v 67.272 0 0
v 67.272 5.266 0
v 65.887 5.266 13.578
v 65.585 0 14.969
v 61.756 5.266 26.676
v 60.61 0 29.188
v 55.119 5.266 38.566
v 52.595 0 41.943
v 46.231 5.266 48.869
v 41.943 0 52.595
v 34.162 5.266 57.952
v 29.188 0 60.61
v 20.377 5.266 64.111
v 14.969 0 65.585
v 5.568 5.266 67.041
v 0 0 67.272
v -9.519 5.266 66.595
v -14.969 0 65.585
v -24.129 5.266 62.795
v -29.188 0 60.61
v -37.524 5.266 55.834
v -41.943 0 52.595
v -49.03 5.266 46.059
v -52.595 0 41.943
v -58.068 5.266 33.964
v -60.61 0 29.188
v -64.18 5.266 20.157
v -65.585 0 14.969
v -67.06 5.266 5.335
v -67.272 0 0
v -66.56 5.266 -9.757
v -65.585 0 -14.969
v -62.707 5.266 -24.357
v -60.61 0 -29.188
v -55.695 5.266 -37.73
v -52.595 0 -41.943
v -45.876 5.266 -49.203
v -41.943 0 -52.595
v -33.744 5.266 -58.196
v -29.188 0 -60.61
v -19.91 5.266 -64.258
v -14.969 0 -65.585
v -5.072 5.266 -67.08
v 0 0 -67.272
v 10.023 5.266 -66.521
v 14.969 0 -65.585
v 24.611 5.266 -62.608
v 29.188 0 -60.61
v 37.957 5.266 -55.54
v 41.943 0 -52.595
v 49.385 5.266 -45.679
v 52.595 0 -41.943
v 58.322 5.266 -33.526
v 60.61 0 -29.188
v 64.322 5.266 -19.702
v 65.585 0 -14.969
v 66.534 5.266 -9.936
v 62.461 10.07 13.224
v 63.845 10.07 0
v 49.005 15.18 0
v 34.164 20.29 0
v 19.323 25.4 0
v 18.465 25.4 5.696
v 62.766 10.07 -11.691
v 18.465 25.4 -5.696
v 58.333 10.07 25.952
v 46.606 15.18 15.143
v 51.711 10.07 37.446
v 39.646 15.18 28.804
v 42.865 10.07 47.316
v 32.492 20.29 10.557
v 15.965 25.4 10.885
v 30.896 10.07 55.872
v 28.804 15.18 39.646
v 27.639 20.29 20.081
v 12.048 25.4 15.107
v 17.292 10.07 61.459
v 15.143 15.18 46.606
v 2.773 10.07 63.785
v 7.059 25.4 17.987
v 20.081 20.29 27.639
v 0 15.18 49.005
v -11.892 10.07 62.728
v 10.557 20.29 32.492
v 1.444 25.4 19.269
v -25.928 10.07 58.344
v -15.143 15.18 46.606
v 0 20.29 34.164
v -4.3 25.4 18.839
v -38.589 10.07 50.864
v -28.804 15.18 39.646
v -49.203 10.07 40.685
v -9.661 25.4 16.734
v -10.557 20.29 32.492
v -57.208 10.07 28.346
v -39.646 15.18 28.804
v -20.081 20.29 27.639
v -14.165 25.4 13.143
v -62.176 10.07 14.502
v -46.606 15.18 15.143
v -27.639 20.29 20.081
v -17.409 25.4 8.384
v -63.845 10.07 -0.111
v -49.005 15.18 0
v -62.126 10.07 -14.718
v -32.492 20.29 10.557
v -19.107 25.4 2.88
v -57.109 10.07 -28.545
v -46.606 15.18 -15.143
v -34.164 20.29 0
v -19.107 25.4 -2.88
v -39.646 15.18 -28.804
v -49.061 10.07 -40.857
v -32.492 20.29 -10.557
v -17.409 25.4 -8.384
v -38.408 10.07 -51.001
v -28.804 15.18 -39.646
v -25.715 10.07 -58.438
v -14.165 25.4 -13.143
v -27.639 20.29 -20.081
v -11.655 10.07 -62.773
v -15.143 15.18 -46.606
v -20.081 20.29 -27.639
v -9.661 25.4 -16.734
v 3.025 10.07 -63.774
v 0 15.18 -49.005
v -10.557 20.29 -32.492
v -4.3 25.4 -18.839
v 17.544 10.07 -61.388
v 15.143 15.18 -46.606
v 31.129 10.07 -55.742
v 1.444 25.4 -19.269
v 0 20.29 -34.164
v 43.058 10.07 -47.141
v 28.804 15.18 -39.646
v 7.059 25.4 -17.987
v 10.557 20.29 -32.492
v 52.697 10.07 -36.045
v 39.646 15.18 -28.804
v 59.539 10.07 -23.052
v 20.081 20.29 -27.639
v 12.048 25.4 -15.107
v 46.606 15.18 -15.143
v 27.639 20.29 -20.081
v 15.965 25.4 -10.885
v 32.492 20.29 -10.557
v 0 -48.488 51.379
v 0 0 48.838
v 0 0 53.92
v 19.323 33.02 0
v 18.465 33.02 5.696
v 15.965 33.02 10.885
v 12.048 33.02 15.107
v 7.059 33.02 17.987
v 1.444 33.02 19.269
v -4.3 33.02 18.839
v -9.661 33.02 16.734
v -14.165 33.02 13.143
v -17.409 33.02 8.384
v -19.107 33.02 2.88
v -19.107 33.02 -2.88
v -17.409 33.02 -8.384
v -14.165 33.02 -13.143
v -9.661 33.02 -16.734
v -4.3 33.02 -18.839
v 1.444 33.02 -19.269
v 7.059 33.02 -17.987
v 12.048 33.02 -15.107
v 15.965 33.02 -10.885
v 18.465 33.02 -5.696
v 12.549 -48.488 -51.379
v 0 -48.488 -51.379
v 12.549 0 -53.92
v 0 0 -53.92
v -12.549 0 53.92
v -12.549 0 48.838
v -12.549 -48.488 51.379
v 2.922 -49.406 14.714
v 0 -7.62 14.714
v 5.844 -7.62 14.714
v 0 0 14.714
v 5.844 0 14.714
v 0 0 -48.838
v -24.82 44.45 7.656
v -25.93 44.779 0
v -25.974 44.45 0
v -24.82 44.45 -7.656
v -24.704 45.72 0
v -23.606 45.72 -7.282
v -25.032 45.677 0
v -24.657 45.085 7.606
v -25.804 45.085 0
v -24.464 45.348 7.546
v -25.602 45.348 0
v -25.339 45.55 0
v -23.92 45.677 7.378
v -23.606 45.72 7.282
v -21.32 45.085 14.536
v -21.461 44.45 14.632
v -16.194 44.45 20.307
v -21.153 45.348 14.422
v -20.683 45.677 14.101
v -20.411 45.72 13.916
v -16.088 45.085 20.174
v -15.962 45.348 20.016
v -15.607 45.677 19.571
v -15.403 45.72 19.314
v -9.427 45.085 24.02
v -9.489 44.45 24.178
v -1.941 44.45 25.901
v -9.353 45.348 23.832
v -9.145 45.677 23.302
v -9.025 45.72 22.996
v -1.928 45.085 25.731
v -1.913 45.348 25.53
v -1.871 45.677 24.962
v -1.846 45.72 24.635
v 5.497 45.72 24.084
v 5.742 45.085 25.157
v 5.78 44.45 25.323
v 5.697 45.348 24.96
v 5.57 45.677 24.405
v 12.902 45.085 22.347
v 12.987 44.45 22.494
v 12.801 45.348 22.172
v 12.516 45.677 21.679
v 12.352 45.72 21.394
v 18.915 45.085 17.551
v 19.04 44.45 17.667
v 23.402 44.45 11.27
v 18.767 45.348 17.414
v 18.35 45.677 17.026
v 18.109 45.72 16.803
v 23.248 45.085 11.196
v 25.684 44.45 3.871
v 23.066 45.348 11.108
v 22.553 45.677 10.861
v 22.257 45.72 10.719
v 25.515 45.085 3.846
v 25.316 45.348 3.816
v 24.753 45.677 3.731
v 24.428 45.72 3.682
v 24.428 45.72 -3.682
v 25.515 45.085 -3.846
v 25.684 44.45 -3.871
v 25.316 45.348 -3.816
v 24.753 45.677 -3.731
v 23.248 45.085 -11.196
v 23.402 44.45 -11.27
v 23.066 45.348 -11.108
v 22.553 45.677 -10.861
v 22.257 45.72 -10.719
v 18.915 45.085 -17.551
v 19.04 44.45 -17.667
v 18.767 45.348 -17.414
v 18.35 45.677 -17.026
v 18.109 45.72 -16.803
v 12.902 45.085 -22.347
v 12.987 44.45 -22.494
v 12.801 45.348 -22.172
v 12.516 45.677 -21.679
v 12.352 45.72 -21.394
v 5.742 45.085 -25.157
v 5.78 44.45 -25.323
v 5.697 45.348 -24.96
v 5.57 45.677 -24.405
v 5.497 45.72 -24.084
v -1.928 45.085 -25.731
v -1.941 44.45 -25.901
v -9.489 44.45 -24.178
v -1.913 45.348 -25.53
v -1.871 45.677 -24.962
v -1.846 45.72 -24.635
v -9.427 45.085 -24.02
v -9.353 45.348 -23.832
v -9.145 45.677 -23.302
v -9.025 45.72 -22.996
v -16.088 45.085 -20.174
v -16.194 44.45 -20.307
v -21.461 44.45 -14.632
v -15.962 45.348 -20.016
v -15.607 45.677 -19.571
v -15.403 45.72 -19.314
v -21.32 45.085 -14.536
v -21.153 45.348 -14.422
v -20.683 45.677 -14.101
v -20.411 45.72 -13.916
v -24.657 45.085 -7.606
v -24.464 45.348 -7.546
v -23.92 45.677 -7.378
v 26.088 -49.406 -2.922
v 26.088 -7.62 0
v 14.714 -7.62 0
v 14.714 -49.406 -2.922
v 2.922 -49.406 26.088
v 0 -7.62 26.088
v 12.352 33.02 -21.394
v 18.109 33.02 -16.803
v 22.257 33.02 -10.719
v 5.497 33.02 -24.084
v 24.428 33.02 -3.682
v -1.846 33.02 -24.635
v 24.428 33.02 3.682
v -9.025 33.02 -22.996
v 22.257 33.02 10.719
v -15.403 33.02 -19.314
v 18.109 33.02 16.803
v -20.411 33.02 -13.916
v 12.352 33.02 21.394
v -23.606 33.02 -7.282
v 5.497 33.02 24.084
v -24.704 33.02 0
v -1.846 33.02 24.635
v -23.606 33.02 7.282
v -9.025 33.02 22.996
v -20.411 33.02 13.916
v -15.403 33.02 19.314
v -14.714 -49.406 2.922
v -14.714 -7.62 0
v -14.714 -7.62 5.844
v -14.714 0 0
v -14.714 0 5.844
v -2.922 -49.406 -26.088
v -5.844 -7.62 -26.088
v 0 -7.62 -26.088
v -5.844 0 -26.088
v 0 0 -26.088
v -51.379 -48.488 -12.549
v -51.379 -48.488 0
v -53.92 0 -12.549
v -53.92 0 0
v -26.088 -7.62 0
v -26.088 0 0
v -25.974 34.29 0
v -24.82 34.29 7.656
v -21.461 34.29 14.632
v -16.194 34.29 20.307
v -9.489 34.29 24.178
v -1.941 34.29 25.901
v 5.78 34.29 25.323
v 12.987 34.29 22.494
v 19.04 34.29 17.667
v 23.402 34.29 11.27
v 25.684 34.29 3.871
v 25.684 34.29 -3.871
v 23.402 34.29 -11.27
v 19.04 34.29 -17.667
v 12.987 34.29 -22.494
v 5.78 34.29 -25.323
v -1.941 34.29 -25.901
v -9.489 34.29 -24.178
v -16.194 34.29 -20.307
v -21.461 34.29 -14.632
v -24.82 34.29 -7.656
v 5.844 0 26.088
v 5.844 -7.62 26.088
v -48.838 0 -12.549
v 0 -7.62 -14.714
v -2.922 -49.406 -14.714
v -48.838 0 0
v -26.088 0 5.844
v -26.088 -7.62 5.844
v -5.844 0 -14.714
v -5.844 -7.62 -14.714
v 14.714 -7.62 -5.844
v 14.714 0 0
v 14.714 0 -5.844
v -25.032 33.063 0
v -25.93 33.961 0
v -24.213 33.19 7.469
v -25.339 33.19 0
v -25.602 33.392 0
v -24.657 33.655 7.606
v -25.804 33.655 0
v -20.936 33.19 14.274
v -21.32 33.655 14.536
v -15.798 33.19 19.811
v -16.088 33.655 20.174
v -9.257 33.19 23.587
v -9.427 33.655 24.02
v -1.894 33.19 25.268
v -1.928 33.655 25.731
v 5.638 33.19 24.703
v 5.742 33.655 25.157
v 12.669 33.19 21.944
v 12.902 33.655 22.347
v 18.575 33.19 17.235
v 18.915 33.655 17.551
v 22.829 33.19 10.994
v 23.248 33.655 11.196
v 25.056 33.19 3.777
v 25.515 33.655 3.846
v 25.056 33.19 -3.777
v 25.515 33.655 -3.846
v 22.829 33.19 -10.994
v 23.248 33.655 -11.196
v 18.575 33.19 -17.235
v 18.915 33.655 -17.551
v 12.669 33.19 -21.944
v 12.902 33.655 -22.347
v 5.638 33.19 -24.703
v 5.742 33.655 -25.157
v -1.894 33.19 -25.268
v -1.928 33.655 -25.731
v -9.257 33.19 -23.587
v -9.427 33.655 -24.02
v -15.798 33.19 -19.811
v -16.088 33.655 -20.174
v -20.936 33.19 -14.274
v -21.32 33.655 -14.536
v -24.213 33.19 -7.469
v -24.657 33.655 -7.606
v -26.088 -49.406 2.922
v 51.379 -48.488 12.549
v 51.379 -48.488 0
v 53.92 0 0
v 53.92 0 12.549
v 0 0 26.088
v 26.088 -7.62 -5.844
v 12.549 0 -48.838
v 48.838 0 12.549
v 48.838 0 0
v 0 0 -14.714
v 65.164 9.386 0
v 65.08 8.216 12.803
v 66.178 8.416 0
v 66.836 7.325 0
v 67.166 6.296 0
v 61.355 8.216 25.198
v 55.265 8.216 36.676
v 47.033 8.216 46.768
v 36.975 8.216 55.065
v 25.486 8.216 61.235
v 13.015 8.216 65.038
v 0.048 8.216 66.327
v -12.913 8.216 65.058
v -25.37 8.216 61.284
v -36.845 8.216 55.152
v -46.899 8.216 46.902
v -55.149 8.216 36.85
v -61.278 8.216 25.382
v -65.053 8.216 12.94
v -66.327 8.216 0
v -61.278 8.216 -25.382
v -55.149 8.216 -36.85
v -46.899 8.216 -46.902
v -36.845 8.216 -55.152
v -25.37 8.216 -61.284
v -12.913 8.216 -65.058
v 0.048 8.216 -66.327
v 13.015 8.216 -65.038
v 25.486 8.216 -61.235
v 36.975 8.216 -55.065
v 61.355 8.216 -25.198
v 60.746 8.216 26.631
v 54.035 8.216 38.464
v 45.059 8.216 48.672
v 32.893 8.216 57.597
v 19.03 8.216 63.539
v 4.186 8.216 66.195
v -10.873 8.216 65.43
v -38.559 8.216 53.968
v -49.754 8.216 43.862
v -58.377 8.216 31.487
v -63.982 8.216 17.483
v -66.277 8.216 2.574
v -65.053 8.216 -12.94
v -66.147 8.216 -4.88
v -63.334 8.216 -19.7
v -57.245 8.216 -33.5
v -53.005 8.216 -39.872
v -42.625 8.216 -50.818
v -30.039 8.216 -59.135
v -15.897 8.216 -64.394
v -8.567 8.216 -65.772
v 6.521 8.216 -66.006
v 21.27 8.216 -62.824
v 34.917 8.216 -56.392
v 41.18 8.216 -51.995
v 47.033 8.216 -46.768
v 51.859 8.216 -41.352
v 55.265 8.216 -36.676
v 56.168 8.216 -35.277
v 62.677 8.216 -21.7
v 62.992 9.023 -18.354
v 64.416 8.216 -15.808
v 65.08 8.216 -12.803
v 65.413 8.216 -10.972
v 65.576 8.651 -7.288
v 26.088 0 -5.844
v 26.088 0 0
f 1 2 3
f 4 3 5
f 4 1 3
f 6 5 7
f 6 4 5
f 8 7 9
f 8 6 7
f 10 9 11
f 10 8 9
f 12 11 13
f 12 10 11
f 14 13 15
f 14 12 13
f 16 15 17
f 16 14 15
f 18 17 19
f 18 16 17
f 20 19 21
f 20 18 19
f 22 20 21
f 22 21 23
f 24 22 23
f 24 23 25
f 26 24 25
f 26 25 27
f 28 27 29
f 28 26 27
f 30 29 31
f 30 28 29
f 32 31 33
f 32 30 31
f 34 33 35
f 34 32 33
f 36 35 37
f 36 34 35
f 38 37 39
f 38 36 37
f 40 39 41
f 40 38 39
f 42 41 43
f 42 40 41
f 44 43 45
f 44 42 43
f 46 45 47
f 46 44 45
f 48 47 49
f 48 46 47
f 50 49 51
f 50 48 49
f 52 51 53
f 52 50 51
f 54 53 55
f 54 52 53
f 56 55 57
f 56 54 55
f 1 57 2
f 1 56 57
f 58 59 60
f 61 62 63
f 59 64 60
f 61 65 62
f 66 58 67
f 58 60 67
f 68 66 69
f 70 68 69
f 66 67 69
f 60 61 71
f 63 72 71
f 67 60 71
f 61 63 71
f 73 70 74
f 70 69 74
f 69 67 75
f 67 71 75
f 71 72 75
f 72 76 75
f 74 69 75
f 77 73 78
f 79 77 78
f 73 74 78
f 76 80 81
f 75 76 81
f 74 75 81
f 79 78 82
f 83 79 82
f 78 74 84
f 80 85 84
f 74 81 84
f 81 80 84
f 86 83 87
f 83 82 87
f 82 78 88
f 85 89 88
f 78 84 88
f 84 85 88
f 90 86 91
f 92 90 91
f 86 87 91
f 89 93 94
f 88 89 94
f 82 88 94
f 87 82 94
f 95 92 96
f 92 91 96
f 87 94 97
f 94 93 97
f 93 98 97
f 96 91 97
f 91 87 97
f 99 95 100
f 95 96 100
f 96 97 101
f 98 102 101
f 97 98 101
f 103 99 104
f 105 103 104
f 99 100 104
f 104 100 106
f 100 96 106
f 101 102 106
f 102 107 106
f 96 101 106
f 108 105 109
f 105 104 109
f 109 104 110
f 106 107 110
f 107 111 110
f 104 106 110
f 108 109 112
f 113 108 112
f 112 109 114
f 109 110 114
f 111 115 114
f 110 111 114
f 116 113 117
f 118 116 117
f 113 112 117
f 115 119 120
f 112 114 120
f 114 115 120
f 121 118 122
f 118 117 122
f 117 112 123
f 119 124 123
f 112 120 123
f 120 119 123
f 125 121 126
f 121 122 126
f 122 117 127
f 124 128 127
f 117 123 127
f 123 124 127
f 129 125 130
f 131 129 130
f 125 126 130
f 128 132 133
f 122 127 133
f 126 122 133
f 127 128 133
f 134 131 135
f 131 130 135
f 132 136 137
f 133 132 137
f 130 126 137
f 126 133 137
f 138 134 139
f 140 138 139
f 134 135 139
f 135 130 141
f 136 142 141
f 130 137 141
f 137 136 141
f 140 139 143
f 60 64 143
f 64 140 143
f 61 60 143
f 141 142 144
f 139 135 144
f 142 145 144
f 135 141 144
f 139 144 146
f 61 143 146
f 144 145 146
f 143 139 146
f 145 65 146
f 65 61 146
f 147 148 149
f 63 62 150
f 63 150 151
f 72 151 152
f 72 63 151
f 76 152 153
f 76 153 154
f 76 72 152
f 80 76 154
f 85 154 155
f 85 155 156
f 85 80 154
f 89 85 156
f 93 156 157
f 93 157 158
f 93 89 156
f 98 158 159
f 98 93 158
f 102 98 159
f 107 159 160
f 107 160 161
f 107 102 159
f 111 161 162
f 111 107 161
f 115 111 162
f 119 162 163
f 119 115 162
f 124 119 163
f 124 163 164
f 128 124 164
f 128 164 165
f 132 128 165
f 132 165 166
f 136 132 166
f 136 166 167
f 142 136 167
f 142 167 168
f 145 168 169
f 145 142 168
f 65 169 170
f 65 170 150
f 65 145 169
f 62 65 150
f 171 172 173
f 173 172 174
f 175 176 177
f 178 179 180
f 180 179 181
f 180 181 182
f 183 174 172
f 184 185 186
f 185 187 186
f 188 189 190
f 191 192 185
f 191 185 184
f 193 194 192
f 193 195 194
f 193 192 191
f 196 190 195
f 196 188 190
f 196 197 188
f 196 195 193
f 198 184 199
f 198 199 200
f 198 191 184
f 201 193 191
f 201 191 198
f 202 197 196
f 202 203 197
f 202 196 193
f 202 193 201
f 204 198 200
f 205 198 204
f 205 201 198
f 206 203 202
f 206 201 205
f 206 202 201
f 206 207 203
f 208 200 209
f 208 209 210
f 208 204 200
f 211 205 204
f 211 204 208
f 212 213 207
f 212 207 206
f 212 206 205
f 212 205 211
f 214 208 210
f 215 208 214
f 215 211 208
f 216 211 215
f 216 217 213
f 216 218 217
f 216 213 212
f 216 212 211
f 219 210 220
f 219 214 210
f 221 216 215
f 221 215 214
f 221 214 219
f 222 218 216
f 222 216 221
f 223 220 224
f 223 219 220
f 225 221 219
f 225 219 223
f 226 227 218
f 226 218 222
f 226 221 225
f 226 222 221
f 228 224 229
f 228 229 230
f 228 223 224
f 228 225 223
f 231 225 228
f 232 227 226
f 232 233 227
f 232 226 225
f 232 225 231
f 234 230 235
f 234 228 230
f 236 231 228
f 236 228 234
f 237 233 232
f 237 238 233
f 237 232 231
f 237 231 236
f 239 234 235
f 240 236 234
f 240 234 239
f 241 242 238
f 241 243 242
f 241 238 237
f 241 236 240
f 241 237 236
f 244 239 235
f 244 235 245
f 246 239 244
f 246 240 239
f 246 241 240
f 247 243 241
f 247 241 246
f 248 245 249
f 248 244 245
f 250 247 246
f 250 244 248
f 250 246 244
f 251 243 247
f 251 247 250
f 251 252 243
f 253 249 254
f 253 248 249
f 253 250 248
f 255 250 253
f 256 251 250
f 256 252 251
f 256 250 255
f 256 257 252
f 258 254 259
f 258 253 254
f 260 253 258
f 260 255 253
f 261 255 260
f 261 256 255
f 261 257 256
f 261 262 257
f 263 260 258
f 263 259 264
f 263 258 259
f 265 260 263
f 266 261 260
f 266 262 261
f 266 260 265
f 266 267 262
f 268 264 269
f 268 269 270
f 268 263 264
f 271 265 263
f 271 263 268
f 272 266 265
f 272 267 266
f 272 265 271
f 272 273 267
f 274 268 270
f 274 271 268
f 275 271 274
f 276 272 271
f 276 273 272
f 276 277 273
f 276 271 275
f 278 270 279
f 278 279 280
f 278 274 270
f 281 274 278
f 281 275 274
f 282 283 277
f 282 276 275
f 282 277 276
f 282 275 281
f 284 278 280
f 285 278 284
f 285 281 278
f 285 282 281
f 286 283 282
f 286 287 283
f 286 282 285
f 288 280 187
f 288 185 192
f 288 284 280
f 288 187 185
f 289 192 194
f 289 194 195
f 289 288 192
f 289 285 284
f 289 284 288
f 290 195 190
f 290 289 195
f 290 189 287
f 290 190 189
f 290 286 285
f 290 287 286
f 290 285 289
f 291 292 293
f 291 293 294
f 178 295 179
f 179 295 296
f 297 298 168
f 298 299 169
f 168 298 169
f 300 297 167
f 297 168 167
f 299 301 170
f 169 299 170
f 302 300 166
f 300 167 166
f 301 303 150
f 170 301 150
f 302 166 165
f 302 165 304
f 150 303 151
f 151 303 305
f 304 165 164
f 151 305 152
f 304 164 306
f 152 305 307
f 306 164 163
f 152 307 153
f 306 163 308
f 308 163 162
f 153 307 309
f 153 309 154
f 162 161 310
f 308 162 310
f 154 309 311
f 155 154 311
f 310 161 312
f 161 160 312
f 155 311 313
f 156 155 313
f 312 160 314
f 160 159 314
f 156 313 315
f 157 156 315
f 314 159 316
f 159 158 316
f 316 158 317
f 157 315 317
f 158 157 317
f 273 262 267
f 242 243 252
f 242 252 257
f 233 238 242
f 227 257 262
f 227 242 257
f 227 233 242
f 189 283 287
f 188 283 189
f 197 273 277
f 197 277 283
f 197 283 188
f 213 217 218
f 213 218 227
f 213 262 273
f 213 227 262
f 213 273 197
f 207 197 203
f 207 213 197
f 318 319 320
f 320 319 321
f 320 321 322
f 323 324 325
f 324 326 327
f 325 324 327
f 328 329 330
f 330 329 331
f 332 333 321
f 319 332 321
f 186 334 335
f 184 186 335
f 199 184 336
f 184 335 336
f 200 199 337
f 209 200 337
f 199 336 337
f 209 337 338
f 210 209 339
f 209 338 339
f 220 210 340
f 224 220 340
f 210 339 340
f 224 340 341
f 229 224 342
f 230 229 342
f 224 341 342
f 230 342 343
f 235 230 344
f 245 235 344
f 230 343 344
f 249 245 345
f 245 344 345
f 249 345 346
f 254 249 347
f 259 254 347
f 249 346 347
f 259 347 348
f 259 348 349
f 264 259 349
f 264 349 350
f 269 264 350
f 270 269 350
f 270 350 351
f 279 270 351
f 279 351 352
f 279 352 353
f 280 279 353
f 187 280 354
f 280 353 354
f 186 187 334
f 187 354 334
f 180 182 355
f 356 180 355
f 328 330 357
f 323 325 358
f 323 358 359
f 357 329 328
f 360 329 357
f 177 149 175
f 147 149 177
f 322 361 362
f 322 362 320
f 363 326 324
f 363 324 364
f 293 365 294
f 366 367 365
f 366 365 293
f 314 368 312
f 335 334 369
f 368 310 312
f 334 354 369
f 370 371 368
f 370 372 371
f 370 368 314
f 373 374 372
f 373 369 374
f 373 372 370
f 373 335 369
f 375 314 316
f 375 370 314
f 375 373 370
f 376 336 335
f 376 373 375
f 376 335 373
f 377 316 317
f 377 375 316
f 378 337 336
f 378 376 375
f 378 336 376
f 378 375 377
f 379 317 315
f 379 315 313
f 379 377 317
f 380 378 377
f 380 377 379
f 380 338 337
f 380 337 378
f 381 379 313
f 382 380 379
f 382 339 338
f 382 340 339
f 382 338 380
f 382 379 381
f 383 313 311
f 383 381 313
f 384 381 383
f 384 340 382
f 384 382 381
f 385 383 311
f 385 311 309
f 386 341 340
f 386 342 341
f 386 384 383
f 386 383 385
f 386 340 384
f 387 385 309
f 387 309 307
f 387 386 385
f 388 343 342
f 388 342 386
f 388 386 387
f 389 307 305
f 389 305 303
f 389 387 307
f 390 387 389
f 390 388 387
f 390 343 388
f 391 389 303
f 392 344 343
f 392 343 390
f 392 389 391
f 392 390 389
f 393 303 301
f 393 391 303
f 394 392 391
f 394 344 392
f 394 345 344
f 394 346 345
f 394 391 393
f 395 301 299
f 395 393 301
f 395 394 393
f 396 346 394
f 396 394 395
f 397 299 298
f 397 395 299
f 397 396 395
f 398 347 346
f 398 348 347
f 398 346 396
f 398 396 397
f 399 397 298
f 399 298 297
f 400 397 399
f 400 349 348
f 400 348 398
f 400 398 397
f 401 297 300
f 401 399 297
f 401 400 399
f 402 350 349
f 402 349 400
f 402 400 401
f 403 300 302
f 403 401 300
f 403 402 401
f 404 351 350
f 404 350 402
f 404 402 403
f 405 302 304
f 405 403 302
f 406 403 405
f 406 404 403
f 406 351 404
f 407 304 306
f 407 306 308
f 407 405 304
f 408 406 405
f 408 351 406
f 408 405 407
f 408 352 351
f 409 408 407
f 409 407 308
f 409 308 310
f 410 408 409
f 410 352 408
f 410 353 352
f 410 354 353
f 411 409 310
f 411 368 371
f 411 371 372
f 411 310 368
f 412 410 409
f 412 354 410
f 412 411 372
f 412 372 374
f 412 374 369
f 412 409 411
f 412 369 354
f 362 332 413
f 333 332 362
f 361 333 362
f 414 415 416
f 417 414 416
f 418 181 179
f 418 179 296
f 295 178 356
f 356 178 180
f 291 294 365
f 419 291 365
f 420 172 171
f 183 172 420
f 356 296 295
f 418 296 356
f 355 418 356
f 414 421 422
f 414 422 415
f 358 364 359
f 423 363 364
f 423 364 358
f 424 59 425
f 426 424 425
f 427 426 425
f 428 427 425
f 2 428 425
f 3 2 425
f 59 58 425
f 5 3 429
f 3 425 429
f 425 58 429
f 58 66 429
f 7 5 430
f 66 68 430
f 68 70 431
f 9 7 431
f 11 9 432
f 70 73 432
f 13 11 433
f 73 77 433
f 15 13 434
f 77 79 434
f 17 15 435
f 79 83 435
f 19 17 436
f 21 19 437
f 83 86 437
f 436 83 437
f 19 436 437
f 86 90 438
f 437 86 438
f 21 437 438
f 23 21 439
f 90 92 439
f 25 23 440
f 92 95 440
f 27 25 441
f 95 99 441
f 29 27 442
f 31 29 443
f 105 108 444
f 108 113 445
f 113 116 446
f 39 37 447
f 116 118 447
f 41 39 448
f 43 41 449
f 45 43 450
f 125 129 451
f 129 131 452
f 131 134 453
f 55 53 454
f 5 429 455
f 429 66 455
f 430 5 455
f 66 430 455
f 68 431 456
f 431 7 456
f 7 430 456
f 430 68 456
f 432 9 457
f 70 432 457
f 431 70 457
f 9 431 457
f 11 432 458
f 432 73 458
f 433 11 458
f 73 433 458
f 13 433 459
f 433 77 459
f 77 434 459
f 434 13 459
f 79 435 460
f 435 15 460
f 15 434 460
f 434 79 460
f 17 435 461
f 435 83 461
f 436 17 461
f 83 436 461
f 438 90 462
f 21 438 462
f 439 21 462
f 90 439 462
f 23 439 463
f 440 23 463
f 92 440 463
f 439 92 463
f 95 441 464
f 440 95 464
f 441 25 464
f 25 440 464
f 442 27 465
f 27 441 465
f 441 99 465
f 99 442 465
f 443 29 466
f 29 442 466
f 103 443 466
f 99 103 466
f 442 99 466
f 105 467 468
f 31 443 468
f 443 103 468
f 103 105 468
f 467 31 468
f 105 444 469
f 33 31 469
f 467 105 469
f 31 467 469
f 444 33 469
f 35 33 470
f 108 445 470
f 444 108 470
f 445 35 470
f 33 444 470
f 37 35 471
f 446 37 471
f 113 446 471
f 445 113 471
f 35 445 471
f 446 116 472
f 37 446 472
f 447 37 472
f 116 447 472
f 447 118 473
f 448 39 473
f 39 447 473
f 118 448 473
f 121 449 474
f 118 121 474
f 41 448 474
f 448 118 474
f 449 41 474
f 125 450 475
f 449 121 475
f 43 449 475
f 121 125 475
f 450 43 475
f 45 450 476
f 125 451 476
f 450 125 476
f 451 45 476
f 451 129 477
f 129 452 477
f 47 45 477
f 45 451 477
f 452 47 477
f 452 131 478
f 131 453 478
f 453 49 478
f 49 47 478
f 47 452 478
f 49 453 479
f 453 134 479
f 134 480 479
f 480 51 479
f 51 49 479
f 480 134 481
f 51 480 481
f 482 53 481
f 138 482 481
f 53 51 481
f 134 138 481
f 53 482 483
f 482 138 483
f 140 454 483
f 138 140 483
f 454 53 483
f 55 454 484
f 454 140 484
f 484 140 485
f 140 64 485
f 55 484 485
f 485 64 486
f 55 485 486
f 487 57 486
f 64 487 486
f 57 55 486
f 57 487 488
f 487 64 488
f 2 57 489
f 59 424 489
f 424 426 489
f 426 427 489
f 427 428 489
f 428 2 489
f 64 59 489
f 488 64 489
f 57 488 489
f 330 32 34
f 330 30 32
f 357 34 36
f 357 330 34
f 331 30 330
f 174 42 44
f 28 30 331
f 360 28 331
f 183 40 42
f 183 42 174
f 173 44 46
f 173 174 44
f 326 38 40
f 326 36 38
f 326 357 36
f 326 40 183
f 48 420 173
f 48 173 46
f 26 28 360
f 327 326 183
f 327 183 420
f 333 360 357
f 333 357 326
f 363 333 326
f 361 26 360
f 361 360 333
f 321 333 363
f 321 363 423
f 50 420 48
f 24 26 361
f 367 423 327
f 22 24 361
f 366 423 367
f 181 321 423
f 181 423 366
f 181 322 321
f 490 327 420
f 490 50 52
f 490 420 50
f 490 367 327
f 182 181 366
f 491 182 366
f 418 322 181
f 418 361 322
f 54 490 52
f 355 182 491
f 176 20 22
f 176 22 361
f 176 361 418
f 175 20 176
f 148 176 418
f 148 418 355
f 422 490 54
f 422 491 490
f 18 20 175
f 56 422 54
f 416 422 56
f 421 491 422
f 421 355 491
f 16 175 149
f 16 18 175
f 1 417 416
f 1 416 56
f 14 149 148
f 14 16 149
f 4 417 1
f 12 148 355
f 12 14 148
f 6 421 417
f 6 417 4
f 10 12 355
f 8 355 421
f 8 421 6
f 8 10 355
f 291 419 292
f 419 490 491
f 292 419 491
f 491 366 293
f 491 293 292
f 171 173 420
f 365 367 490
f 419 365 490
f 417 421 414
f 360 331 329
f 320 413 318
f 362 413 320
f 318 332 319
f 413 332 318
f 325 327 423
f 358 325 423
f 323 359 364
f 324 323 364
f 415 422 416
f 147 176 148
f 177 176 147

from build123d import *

# Parameters (mm, degrees)
F0_R         = 67.2715048221
F1_DEPTH     = 25.4
F2_SIZE2     = 47.9485215904
F2_SIZE      = 16.51
F3_DEPTH     = 7.62
F4_R         = 25.9737658724
F5_DEPTH     = 12.7
F6_W         = 12.5492112711
F6_H         = 5.0823129714
F6_W_2       = 5.8439155109
F6_H_2       = 11.3746980205
F6_W_3       = 5.0823129714
F6_H_3       = 12.5492112711
F6_W_4       = 11.3746980205
F6_H_4       = 5.8439155109
F7_DEPTH     = 50.8
F8_T4_DEPTH  = 276.6958225406
F8_T9_DEPTH  = 276.6958225406
F9_T4_DEPTH  = 235.8904693574
F9_T9_DEPTH  = 235.8904693574
F10_T1_DEPTH = 123.632583689
F11_T4_DEPTH = 235.8904693574
F11_T9_DEPTH = 235.8904693574
F12_T4_DEPTH = 235.8904693574
F12_T9_DEPTH = 235.8904693574
F13_T4_DEPTH = 276.6958225406
F13_T9_DEPTH = 276.6958225406
F14_T4_DEPTH = 276.6958225406
F14_T9_DEPTH = 276.6958225406
F15_T4_DEPTH = 276.6958225406
F15_T9_DEPTH = 276.6958225406
F16_R        = 5.08
F17_R        = 1.27


# Not quite as in the source:
# - a fillet or chamfer that OpenCascade refuses, or shapes differently, is made with other operations: its cross-section is extruded or revolved along the edge and cut away or added


with BuildPart() as f1:
    # F0 (on Front) → F1 (new body)
    with BuildSketch(Plane.XZ):
        Circle(F0_R)
    extrude(amount=-F1_DEPTH)

    # F2
    f2_edges = [f1.edges().sort_by_distance(p)[0] for p in [
        (-67.271505, 25.4, 0),
    ]]
    f2_side = f1.faces().sort_by_distance((-67.271505, 12.7, 0))[0]
    chamfer(f2_edges, length=F2_SIZE, length2=F2_SIZE2, reference=f2_side)

    # F3 (add): a face of the model
    f3_faces = [f1.faces().sort_by_distance(p)[0] for p in [
        (0, 25.4, 0),
    ]]
    extrude(f3_faces, amount=F3_DEPTH)

    # F4 (on face) → F5 (join)
    with BuildSketch(Plane(origin=(0, 33.02, 0), x_dir=(-1, 0, 0), z_dir=(0, 1, 0))):
        Circle(F4_R)
    extrude(amount=F5_DEPTH)

    # F6 (on face) → F7 (join)
    with BuildSketch(Plane.XZ):
        with Locations((-6.2746056356, 51.3789299875)):
            Rectangle(F6_W, F6_H)
        with Locations((2.9219577555, 20.4010321759)):
            Rectangle(F6_W_2, F6_H_2)
        with Locations((-51.3789299875, -6.2746056356)):
            Rectangle(F6_W_3, F6_H_3)
        with Locations((-20.4010321759, 2.9219577555)):
            Rectangle(F6_W_4, F6_H_4)
        with Locations((6.2746056356, -51.3789299875)):
            Rectangle(F6_W, F6_H)
        with Locations((-2.9219577555, -20.4010321759)):
            Rectangle(F6_W_2, F6_H_2)
        with Locations((51.3789299875, 6.2746056356)):
            Rectangle(F6_W_3, F6_H_3)
        with Locations((20.4010321759, -2.9219577555)):
            Rectangle(F6_W_4, F6_H_4)
    extrude(amount=F7_DEPTH)

    # F8: chamfer of 50.8 x 2.6623151876 on 2 edges, made by hand


with BuildPart() as f8_tool2:
    # F8_s3 → F8_t4 (new body)
    with BuildSketch(Plane.YZ.offset(132.0733056347)):
        Polygon((0, 53.9200864732), (-50.8, 51.2577712856), (-50.8, 53.9200864732), align=None)
    extrude(amount=-F8_T4_DEPTH)

    split(bisect_by=Plane.XZ, keep=Keep.TOP)


with BuildPart() as f1_1:
    add(f1.part)

    # F8_t1: cut F8_tool2
    add(f8_tool2.part, mode=Mode.SUBTRACT)


with BuildPart() as f8_tool7:
    # F8_s8 → F8_t9 (new body)
    with BuildSketch(Plane.YZ.offset(-144.6225169058)):
        Polygon((0, 48.8377735019), (-50.8, 51.5000886895), (-50.8, 48.8377735019), align=None)
    extrude(amount=F8_T9_DEPTH)

    split(bisect_by=Plane.XZ, keep=Keep.TOP)


with BuildPart() as f1_2:
    add(f1_1.part)

    # F8_t6: cut F8_tool7
    add(f8_tool7.part, mode=Mode.SUBTRACT)

    # F9: chamfer of 43.18 x 3.0194397397 on 2 edges, made by hand


with BuildPart() as f9_tool2:
    # F9_s3 → F9_t4 (new body)
    with BuildSketch(Plane.XY.offset(-97.5442025028)):
        Polygon((2.8244757712, -50.8), (5.8439155109, -7.62), (5.8439155109, -50.8), align=None)
    extrude(amount=F9_T4_DEPTH)

    split(bisect_by=Plane.XY.offset(-48.8377735019), keep=Keep.TOP)


with BuildPart() as f1_3:
    add(f1_2.part)

    # F9_t1: cut F9_tool2
    add(f9_tool2.part, mode=Mode.SUBTRACT)


with BuildPart() as f9_tool7:
    # F9_s8 → F9_t9 (new body)
    with BuildSketch(Plane.XY.offset(138.3462668546)):
        Polygon((3.0194397397, -50.8), (0, -7.62), (0, -50.8), align=None)
    extrude(amount=-F9_T9_DEPTH)

    split(bisect_by=Plane.XY.offset(-26.0883811861), keep=Keep.TOP)


with BuildPart() as f1_4:
    add(f1_3.part)

    # F9_t6: cut F9_tool7
    add(f9_tool7.part, mode=Mode.SUBTRACT)

    # F10: chamfer of 43.18 x 3.0194397397 on 2 edges, made by hand

    # F10_s2 → F10_t1 (cut)
    with BuildSketch(Plane.YZ.offset(-138.3462668546)):
        Polygon((-7.62, 0), (-50.8, 3.0194397397), (-50.8, 0), align=None)
        Polygon((-50.8, 2.8244757712), (-7.62, 5.8439155109), (-50.8, 5.8439155109), align=None)
    extrude(amount=F10_T1_DEPTH, mode=Mode.SUBTRACT)

    # F11: chamfer of 43.18 x 3.0194397397 on 2 edges, made by hand


with BuildPart() as f11_tool2:
    # F11_s3 → F11_t4 (new body)
    with BuildSketch(Plane.XY.offset(97.5442025028)):
        Polygon((-2.8244757712, -50.8), (-5.8439155109, -7.62), (-5.8439155109, -50.8), align=None)
    extrude(amount=-F11_T4_DEPTH)

    split(bisect_by=Plane(origin=(0, 2.5524687068, 48.7040042853), x_dir=(1, 0, 0), z_dir=(0, -0.0523359562, -0.9986295348)), keep=Keep.TOP)


with BuildPart() as f1_5:
    add(f1_4.part)

    # F11_t1: cut F11_tool2
    add(f11_tool2.part, mode=Mode.SUBTRACT)


with BuildPart() as f11_tool7:
    # F11_s8 → F11_t9 (new body)
    with BuildSketch(Plane.XY.offset(-138.3462668546)):
        Polygon((0, -7.62), (-3.0194397397, -50.8), (0, -50.8), align=None)
    extrude(amount=F11_T9_DEPTH)

    split(bisect_by=Plane(origin=(0, 2.5524687068, 48.7040042853), x_dir=(1, 0, 0), z_dir=(0, -0.0523359562, -0.9986295348)), keep=Keep.TOP)


with BuildPart() as f1_6:
    add(f1_5.part)

    # F11_t6: cut F11_tool7
    add(f11_tool7.part, mode=Mode.SUBTRACT)

    # F12: chamfer of 43.18 x 3.0194397397 on 2 edges, made by hand


with BuildPart() as f12_tool2:
    # F12_s3 → F12_t4 (new body)
    with BuildSketch(Plane.YZ.offset(-97.5442025028)):
        Polygon((-50.8, -2.8244757712), (-7.62, -5.8439155109), (-50.8, -5.8439155109), align=None)
    extrude(amount=F12_T4_DEPTH)

    split(bisect_by=Plane.YZ.offset(-48.8377735019), keep=Keep.TOP)


with BuildPart() as f1_7:
    add(f1_6.part)

    # F12_t1: cut F12_tool2
    add(f12_tool2.part, mode=Mode.SUBTRACT)


with BuildPart() as f12_tool7:
    # F12_s8 → F12_t9 (new body)
    with BuildSketch(Plane.YZ.offset(138.3462668546)):
        Polygon((-7.62, 0), (-50.8, -3.0194397397), (-50.8, 0), align=None)
    extrude(amount=-F12_T9_DEPTH)

    split(bisect_by=Plane.YZ.offset(-48.8377735019), keep=Keep.TOP)


with BuildPart() as f1_8:
    add(f1_7.part)

    # F12_t6: cut F12_tool7
    add(f12_tool7.part, mode=Mode.SUBTRACT)

    # F13: chamfer of 50.8 x 2.6623151876 on 2 edges, made by hand


with BuildPart() as f13_tool2:
    # F13_s3 → F13_t4 (new body)
    with BuildSketch(Plane.XY.offset(132.0733056347)):
        Polygon((-51.5000886895, -50.8), (-48.8377735019, 0), (-48.8377735019, -50.8), align=None)
    extrude(amount=-F13_T4_DEPTH)

    split(bisect_by=Plane.XZ, keep=Keep.TOP)


with BuildPart() as f1_9:
    add(f1_8.part)

    # F13_t1: cut F13_tool2
    add(f13_tool2.part, mode=Mode.SUBTRACT)


with BuildPart() as f13_tool7:
    # F13_s8 → F13_t9 (new body)
    with BuildSketch(Plane.XY.offset(132.0733056347)):
        Polygon((-51.2577712856, -50.8), (-53.9200864732, 0), (-53.9200864732, -50.8), align=None)
    extrude(amount=-F13_T9_DEPTH)

    split(bisect_by=Plane.XZ, keep=Keep.TOP)


with BuildPart() as f1_10:
    add(f1_9.part)

    # F13_t6: cut F13_tool7
    add(f13_tool7.part, mode=Mode.SUBTRACT)

    # F14: chamfer of 50.8 x 2.6623151876 on 2 edges, made by hand


with BuildPart() as f14_tool2:
    # F14_s3 → F14_t4 (new body)
    with BuildSketch(Plane.YZ.offset(-132.0733056347)):
        Polygon((-50.8, -51.2577712856), (0, -53.9200864732), (-50.8, -53.9200864732), align=None)
    extrude(amount=F14_T4_DEPTH)

    split(bisect_by=Plane.XZ, keep=Keep.TOP)


with BuildPart() as f1_11:
    add(f1_10.part)

    # F14_t1: cut F14_tool2
    add(f14_tool2.part, mode=Mode.SUBTRACT)


with BuildPart() as f14_tool7:
    # F14_s8 → F14_t9 (new body)
    with BuildSketch(Plane.YZ.offset(-132.0733056347)):
        Polygon((-50.8, -51.5000886895), (0, -48.8377735019), (-50.8, -48.8377735019), align=None)
    extrude(amount=F14_T9_DEPTH)

    split(bisect_by=Plane.XZ, keep=Keep.TOP)


with BuildPart() as f1_12:
    add(f1_11.part)

    # F14_t6: cut F14_tool7
    add(f14_tool7.part, mode=Mode.SUBTRACT)

    # F15: chamfer of 50.8 x 2.6623151876 on 2 edges, made by hand


with BuildPart() as f15_tool2:
    # F15_s3 → F15_t4 (new body)
    with BuildSketch(Plane.XY.offset(-132.0733056347)):
        Polygon((51.2577712856, -50.8), (53.9200864732, 0), (53.9200864732, -50.8), align=None)
    extrude(amount=F15_T4_DEPTH)

    split(bisect_by=Plane.XZ, keep=Keep.TOP)


with BuildPart() as f1_13:
    add(f1_12.part)

    # F15_t1: cut F15_tool2
    add(f15_tool2.part, mode=Mode.SUBTRACT)


with BuildPart() as f15_tool7:
    # F15_s8 → F15_t9 (new body)
    with BuildSketch(Plane.XY.offset(144.6225169058)):
        Polygon((48.8377735019, 0), (51.5000886895, -50.8), (48.8377735019, -50.8), align=None)
    extrude(amount=-F15_T9_DEPTH)

    split(bisect_by=Plane.XZ, keep=Keep.TOP)


with BuildPart() as f1_14:
    add(f1_13.part)

    # F15_t6: cut F15_tool7
    add(f15_tool7.part, mode=Mode.SUBTRACT)

    # F16
    f16_edges = [f1_14.edges().sort_by_distance(p)[0] for p in [
        (-67.271505, 8.89, 0),
    ]]
    fillet(f16_edges, radius=F16_R)

    # F17
    f17_edges = [f1_14.edges().sort_by_distance(p)[0] for p in [
        (25.973766, 45.72, 0),
        (25.973766, 33.02, 0),
    ]]
    fillet(f17_edges, radius=F17_R)


solid = f1_14.part
